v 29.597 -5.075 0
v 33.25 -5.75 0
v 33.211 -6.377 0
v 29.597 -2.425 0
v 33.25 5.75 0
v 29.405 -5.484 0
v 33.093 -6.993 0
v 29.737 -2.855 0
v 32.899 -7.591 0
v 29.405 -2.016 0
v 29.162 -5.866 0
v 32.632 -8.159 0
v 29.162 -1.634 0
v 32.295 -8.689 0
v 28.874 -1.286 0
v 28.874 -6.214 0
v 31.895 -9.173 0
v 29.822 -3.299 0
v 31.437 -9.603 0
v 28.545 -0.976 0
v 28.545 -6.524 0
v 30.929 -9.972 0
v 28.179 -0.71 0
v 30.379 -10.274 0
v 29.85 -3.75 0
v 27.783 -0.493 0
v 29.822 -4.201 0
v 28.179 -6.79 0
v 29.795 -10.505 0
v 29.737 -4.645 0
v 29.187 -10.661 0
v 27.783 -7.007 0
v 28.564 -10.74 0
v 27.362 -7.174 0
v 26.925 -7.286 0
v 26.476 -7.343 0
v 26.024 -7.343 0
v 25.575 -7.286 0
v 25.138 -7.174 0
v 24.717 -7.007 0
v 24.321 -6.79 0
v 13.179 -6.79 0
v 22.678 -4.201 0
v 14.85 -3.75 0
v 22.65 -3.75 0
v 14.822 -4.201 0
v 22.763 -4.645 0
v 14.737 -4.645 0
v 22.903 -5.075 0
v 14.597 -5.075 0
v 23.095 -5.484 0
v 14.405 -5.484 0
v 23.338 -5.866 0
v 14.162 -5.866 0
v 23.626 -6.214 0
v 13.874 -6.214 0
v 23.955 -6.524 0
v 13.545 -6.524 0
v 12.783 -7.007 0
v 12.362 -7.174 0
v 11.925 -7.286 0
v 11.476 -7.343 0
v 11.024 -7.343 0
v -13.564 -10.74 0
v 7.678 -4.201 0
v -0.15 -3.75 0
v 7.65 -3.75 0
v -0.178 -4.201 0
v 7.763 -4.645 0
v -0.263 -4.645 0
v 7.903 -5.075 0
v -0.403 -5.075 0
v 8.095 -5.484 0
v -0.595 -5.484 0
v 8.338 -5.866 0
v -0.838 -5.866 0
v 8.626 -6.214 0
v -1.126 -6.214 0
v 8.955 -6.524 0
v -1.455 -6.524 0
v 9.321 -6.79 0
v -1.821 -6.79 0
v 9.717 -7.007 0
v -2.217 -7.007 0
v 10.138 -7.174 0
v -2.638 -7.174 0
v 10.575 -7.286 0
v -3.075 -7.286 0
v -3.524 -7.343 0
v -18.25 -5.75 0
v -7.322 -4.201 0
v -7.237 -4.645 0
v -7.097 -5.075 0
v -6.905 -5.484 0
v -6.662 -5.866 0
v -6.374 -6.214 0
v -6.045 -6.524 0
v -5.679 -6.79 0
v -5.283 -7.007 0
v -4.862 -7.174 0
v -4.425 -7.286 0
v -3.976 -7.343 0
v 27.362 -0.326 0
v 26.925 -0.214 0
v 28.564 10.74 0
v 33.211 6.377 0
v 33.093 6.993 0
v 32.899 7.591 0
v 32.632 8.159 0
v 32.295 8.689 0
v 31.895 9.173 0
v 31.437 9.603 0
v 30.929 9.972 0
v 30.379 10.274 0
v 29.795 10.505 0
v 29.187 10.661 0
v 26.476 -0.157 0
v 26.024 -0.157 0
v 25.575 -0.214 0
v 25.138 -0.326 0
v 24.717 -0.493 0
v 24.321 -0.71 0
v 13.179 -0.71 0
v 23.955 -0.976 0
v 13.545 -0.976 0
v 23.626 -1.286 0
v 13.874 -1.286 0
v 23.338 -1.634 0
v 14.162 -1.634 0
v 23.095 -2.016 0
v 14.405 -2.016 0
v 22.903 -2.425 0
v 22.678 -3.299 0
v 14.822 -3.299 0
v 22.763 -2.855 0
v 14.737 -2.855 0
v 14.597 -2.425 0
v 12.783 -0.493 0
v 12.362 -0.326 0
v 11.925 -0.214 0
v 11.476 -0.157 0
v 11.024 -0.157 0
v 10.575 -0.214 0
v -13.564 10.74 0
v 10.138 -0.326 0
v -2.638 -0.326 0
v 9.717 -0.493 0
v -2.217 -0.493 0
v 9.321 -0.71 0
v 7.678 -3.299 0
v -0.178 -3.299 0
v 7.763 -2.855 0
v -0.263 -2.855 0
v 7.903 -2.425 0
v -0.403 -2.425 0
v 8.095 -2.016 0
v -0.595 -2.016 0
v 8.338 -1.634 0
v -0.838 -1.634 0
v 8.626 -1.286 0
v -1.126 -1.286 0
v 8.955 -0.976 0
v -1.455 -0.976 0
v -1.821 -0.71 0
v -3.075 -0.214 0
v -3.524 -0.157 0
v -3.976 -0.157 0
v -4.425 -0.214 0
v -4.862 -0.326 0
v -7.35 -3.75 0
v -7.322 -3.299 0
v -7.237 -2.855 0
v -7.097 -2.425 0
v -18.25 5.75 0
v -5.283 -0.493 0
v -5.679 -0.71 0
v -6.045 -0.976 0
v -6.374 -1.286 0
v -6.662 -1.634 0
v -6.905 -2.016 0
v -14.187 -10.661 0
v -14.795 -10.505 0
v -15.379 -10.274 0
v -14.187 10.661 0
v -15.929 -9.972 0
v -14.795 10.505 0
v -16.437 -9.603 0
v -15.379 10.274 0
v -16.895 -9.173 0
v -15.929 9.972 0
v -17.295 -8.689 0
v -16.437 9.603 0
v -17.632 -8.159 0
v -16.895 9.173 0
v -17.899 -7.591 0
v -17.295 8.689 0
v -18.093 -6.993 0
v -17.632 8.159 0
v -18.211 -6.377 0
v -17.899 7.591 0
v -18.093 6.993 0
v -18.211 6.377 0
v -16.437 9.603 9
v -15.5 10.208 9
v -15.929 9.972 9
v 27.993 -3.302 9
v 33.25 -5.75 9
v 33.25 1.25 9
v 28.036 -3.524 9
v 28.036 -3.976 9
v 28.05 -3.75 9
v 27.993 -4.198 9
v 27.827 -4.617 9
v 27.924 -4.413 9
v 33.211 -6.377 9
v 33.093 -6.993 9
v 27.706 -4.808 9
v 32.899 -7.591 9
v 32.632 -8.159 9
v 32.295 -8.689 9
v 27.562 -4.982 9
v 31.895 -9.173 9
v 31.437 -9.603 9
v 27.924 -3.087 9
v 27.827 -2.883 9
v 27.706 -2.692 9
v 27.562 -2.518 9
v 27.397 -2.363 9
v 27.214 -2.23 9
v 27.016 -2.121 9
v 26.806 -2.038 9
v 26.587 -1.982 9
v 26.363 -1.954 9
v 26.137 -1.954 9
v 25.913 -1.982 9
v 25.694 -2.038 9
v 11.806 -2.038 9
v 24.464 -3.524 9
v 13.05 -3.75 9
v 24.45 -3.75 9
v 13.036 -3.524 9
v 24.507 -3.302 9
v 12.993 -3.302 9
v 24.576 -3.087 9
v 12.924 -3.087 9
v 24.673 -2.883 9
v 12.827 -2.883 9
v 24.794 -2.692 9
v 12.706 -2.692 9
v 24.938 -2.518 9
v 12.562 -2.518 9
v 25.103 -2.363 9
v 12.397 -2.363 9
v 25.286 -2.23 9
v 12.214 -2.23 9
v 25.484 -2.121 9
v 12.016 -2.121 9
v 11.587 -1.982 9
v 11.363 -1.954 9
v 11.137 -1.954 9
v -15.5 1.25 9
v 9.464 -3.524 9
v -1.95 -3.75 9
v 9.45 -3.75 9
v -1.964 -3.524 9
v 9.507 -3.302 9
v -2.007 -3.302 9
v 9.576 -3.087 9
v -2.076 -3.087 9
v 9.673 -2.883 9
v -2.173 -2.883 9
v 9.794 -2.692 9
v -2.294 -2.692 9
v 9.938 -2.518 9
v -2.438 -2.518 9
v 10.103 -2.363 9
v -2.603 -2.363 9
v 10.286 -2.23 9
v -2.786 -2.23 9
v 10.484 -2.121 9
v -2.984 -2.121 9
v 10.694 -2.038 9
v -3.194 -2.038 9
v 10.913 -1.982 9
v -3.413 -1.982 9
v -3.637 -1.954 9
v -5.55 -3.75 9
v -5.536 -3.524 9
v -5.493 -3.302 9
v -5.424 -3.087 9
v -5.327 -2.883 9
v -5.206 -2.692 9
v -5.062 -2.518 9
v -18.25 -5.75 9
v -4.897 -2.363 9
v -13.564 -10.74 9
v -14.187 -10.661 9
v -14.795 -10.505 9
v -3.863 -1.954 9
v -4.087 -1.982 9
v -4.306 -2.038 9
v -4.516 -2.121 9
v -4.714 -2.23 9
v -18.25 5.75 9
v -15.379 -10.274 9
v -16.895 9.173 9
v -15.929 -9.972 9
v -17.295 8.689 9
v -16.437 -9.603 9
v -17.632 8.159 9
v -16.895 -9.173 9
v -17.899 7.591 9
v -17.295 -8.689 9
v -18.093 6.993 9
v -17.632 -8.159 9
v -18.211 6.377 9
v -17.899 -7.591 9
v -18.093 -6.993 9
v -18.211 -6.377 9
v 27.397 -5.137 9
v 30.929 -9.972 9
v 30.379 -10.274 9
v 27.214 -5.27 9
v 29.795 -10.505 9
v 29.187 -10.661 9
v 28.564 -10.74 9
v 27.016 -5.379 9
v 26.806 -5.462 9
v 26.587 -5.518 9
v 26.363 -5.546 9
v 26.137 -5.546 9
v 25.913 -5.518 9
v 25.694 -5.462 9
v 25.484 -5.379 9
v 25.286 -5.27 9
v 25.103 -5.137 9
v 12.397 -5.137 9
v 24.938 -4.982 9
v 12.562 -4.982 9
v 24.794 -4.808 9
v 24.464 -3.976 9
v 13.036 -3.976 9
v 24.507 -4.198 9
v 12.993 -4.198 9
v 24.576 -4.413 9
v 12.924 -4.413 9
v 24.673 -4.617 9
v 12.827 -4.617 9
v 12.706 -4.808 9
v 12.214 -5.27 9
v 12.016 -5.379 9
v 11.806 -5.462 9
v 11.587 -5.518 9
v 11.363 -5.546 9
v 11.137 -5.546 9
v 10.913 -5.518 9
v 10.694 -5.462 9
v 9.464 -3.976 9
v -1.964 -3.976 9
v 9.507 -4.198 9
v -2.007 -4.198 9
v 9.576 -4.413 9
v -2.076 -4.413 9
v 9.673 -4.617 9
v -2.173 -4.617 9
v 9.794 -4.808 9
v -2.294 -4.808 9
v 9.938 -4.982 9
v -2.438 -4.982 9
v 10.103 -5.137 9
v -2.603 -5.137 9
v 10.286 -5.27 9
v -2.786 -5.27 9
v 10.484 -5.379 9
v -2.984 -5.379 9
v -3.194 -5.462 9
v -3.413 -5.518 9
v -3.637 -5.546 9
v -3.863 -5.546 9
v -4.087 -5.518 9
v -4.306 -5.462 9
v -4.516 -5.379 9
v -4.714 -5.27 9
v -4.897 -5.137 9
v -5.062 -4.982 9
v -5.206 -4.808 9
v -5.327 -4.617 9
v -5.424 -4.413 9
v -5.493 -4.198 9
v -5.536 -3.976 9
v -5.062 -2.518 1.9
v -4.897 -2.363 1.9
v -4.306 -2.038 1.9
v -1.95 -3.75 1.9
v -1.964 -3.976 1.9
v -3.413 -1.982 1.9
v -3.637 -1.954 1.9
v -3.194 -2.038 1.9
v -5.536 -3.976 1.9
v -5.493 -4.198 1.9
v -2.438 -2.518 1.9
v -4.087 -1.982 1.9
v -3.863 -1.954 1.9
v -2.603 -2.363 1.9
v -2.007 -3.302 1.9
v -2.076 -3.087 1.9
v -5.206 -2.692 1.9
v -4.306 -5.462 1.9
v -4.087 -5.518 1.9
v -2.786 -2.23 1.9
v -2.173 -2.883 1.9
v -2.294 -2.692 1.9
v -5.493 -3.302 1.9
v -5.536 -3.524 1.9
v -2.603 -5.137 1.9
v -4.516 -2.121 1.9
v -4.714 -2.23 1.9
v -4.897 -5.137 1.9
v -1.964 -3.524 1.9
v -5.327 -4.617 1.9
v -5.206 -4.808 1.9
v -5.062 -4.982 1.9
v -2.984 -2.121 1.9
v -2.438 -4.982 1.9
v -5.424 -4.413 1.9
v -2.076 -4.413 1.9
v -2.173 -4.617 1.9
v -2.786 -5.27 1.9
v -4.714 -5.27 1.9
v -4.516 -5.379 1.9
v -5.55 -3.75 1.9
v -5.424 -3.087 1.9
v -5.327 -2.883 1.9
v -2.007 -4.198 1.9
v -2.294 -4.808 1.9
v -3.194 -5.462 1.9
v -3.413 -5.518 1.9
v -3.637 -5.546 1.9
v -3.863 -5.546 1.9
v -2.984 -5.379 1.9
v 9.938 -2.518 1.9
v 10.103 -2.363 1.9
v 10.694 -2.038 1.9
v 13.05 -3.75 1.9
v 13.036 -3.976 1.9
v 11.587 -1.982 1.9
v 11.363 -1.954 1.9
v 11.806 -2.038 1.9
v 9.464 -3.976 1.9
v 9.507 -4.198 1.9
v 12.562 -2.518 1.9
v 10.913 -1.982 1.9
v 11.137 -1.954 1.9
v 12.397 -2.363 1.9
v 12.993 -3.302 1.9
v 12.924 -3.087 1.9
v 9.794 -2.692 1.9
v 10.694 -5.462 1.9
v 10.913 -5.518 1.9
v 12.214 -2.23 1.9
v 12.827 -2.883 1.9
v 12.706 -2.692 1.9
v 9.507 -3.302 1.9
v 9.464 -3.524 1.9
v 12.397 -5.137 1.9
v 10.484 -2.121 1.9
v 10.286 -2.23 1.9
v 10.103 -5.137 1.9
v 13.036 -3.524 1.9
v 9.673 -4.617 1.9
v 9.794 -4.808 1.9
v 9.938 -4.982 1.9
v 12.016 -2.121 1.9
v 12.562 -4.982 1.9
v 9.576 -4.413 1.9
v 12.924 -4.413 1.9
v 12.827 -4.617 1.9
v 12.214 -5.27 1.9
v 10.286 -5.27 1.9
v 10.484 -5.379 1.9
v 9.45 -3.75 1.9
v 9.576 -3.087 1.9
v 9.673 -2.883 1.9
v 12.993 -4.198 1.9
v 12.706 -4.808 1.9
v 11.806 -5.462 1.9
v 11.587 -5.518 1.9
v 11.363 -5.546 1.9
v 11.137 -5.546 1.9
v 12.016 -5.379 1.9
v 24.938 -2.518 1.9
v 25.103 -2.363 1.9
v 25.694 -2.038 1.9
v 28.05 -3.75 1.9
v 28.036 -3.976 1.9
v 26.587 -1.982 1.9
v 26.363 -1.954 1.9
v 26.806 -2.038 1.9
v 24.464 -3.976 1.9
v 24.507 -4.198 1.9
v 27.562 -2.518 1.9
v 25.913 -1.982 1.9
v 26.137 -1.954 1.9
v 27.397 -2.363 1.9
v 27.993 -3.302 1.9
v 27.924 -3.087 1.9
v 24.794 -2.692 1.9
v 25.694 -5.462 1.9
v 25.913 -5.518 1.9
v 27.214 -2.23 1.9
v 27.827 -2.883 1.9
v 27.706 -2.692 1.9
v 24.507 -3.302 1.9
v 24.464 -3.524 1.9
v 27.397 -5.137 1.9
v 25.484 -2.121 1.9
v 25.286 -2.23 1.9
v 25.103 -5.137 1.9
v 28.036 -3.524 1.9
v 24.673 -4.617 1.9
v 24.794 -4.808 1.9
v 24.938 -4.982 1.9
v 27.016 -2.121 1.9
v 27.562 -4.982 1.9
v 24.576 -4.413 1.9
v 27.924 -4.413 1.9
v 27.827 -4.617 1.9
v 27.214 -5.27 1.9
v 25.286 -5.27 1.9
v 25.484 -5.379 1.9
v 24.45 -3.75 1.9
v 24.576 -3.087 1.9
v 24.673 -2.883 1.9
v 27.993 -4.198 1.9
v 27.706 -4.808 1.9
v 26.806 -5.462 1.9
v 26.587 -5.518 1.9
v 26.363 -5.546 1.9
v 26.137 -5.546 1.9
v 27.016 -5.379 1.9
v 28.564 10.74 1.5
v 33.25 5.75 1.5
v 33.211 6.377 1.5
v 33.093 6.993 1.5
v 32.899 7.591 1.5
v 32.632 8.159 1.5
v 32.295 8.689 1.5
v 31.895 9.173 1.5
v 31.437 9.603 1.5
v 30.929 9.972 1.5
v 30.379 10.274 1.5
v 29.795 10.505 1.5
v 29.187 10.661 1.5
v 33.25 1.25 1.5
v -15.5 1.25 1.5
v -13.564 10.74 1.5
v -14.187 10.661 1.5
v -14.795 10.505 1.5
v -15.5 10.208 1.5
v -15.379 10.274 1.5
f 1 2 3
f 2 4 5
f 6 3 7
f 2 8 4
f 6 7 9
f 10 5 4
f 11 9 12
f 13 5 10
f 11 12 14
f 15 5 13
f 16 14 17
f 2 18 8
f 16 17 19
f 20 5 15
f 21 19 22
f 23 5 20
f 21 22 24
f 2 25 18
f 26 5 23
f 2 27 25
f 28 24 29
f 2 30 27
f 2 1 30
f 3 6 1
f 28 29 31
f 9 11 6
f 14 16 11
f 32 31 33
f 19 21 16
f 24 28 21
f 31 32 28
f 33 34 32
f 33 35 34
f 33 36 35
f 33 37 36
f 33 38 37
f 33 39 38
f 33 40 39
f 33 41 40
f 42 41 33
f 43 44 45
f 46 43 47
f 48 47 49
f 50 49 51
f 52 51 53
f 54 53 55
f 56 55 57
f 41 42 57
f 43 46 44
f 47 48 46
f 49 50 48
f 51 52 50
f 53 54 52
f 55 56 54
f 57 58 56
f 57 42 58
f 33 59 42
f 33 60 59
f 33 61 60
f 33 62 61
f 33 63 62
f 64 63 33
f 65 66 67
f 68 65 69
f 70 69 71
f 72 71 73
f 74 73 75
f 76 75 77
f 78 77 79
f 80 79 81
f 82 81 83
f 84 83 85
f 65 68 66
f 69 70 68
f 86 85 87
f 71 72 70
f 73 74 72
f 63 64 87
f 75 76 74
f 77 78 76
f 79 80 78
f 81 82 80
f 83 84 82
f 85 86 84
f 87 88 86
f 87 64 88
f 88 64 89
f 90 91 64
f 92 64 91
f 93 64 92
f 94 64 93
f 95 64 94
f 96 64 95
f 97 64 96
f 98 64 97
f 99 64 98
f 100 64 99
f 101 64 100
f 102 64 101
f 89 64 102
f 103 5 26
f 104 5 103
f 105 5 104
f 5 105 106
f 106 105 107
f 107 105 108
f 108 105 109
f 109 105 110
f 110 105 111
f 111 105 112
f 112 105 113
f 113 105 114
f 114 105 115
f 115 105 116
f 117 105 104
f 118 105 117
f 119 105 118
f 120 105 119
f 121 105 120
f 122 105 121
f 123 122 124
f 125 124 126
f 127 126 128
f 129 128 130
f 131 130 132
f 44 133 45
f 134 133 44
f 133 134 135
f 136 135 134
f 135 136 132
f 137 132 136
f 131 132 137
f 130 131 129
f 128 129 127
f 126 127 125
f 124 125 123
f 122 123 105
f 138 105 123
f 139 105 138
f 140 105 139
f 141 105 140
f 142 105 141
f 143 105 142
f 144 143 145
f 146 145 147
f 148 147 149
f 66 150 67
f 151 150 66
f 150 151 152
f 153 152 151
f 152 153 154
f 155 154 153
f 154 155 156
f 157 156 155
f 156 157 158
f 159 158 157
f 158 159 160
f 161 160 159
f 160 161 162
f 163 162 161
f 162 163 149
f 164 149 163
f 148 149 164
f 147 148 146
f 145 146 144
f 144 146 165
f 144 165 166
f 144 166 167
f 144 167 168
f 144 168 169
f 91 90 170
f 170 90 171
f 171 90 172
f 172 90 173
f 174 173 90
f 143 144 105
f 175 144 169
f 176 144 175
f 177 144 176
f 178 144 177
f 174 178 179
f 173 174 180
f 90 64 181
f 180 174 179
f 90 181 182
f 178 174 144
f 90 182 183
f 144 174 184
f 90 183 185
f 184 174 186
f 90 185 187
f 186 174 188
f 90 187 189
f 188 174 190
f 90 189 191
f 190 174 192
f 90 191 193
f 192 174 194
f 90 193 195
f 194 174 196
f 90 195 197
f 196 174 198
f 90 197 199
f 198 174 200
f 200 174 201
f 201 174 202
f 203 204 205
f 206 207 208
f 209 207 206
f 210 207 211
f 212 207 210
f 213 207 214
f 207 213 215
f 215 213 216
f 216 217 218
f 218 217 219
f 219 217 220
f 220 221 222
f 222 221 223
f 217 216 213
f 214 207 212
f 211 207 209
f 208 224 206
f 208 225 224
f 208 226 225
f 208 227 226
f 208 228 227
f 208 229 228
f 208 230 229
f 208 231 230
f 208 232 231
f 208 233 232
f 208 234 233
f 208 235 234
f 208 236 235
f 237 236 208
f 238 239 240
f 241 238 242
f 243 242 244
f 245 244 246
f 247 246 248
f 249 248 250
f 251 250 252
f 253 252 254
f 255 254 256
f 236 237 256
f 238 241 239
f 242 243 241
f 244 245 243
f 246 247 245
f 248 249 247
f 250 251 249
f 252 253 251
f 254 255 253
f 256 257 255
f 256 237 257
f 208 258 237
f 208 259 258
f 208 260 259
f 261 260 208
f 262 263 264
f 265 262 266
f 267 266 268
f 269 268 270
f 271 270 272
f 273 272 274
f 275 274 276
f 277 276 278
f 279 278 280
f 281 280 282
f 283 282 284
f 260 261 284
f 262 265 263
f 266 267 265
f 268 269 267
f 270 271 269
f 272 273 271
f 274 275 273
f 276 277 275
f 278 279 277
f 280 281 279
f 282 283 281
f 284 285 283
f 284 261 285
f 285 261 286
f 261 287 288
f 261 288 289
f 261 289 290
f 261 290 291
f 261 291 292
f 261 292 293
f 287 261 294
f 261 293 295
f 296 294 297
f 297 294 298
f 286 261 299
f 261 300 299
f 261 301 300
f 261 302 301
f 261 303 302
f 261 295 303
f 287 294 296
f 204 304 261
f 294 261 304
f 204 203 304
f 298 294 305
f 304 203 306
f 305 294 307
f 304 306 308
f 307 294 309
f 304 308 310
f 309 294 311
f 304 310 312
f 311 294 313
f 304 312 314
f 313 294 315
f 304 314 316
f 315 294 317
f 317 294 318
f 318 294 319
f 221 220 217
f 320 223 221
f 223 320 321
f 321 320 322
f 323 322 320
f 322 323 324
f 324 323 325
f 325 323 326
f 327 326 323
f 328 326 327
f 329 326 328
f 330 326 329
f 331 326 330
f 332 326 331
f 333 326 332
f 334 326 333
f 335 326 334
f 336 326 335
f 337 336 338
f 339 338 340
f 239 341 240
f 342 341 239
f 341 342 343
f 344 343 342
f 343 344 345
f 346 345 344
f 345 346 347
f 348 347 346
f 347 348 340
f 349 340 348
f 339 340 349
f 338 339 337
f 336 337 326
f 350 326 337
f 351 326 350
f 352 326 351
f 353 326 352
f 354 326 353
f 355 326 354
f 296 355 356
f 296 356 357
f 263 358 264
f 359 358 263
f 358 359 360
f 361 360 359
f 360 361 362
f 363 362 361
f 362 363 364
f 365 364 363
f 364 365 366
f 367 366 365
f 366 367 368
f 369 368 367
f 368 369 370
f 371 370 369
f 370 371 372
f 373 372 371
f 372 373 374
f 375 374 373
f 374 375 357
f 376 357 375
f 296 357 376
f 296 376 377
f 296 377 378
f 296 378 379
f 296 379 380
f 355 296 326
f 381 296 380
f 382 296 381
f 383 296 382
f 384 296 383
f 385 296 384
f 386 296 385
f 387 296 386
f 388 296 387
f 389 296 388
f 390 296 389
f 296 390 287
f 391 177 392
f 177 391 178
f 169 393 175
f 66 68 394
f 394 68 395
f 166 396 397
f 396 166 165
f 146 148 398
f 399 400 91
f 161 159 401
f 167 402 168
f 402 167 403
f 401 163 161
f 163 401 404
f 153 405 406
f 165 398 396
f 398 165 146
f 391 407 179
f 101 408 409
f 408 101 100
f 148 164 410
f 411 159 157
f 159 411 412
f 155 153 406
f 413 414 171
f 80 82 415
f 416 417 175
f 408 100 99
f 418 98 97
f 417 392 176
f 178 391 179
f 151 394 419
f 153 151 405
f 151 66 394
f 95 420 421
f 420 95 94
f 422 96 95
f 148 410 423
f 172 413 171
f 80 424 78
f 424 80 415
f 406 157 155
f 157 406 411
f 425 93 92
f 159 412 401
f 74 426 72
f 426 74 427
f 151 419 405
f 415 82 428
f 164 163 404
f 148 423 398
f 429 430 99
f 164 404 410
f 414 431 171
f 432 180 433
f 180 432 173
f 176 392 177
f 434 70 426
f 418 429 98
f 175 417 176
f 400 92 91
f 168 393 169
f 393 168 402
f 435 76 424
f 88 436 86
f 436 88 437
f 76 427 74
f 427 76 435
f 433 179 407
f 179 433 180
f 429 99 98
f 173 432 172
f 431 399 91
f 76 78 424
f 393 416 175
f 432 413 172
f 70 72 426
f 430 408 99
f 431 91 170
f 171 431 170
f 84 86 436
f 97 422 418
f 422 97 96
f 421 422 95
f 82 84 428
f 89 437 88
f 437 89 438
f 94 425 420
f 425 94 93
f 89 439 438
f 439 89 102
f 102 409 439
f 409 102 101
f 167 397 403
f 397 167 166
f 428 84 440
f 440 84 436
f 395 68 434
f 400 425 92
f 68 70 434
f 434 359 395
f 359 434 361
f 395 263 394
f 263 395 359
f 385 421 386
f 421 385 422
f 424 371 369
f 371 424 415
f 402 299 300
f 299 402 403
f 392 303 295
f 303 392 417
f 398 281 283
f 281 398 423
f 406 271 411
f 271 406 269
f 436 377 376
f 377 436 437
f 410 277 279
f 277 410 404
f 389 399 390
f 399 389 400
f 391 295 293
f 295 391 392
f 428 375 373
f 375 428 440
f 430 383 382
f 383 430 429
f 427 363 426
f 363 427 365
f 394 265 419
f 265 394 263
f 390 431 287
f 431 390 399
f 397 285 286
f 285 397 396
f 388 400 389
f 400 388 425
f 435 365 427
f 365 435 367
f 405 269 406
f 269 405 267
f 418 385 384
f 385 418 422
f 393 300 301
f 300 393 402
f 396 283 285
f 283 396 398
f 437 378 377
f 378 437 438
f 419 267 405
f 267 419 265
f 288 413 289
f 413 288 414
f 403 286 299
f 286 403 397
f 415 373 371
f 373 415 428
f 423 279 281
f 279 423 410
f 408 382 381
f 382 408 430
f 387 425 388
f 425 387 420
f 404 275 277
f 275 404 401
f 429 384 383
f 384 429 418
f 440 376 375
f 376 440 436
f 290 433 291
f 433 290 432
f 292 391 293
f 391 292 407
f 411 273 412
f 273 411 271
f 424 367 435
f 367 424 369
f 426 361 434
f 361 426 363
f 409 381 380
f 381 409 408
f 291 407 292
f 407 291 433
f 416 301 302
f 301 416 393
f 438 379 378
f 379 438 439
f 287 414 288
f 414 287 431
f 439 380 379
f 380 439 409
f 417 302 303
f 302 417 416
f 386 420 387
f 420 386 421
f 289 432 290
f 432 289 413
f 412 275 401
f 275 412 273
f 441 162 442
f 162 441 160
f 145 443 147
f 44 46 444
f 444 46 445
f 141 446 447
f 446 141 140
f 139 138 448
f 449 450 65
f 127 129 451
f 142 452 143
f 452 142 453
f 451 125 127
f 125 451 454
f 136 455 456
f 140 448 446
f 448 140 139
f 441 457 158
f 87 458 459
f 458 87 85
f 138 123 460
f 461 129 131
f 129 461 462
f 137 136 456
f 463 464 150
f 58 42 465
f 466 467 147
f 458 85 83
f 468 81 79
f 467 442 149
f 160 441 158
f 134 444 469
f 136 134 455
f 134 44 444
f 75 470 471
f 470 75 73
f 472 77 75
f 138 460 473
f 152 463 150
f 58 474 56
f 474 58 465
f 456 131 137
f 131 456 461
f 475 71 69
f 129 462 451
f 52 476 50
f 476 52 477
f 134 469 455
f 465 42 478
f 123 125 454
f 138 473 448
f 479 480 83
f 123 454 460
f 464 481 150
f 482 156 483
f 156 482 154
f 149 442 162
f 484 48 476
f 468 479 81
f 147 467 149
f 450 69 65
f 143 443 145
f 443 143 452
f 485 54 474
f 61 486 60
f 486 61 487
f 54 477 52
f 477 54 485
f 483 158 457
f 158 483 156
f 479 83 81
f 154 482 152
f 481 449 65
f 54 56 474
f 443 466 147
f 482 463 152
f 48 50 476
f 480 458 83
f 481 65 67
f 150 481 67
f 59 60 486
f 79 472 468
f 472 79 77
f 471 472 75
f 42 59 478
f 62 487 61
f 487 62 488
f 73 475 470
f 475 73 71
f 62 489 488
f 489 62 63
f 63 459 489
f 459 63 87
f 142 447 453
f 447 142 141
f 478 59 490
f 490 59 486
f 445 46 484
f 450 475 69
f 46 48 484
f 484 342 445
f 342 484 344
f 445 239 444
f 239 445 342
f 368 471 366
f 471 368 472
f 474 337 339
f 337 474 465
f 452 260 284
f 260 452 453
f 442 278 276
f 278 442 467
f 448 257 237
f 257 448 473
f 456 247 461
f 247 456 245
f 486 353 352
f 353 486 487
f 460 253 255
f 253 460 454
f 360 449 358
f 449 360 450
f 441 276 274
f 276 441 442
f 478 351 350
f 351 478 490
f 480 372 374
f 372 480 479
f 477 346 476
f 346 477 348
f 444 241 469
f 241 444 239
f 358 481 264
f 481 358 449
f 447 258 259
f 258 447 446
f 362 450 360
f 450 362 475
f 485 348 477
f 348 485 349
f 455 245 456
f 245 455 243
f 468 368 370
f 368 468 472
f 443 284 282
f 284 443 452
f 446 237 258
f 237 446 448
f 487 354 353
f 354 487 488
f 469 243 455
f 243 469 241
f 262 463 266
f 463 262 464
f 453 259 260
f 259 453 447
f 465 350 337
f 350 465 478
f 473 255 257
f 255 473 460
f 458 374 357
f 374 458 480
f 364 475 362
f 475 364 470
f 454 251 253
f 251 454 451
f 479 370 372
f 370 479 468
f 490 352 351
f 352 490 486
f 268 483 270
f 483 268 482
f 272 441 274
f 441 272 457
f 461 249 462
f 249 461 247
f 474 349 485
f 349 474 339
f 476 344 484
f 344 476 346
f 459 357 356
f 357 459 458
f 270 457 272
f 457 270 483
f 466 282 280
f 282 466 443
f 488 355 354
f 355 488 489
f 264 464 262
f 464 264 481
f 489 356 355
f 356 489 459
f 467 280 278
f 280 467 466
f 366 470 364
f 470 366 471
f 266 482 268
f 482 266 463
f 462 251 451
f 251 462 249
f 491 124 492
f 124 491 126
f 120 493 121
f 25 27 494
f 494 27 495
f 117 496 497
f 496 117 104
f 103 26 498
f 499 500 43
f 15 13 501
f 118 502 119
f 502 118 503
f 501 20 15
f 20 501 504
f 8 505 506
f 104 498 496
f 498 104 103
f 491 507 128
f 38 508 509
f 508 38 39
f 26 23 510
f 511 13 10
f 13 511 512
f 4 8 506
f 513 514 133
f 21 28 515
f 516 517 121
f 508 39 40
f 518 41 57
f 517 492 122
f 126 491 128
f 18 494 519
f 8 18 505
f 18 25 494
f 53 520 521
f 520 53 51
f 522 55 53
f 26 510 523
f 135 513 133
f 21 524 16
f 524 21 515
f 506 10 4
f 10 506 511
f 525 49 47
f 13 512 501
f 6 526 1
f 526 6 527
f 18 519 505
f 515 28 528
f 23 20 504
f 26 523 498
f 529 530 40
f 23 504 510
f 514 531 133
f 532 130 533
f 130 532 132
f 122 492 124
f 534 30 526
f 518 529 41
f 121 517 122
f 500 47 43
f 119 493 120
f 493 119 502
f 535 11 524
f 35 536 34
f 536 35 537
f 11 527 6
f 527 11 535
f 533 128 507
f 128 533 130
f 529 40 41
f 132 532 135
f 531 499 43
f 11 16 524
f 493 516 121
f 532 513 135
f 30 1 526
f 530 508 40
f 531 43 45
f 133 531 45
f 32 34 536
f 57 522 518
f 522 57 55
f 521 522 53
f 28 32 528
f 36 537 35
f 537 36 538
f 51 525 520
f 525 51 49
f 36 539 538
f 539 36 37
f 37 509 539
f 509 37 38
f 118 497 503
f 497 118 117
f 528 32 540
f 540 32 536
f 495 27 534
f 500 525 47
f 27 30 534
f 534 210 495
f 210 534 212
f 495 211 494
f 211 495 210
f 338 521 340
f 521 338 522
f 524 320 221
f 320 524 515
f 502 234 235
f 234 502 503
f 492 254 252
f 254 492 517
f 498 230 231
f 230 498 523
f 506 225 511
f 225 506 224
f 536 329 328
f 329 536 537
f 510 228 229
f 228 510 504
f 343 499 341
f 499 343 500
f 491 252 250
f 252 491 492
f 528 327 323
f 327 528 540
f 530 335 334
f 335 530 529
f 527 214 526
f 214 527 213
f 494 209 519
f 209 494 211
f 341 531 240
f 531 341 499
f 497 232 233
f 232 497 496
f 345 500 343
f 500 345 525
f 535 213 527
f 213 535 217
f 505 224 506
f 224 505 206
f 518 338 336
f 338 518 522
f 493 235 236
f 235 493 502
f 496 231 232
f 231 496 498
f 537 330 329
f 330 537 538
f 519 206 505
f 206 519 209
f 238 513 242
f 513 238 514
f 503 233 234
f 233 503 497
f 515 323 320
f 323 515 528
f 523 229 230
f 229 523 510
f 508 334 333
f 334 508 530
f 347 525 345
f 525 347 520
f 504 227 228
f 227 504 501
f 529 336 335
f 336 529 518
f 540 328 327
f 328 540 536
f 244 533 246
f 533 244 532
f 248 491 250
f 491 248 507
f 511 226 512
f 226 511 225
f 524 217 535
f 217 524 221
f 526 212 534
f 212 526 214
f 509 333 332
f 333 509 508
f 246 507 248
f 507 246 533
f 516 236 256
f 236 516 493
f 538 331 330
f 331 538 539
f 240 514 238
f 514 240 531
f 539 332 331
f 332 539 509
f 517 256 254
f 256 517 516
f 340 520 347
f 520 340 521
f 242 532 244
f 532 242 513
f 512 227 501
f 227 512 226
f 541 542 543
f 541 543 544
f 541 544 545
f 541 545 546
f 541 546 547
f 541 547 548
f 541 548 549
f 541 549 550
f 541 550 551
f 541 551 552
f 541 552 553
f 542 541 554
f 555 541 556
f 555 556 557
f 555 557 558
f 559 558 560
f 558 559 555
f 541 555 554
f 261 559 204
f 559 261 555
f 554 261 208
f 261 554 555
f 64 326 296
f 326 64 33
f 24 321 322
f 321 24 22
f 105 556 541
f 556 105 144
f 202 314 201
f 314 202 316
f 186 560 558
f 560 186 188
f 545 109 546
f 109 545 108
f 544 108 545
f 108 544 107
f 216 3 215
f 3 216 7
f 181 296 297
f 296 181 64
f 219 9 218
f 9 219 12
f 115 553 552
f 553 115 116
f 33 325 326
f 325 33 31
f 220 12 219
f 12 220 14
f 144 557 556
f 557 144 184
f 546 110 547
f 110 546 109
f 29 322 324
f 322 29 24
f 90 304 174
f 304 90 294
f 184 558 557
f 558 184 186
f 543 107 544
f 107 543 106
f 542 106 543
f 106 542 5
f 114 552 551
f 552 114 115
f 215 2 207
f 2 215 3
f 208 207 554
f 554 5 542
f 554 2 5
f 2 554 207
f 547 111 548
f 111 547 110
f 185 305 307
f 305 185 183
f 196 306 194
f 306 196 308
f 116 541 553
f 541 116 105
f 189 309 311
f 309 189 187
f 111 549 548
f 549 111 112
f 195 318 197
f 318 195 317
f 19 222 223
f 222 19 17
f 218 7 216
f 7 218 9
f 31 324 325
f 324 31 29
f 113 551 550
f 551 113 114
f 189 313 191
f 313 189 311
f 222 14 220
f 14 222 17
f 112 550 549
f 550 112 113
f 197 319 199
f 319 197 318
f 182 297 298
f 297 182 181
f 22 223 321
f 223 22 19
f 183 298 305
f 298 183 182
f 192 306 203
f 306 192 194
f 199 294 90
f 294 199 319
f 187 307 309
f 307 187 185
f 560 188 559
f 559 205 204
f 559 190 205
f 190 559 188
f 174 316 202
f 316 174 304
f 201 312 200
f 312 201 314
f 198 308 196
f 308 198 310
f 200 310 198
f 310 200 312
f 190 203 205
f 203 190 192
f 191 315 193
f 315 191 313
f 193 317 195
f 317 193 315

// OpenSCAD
$fn = 50;


difference() {
	union() {
		translate(v = [7.5000000000, 0, 0]) {
			hull() {
				translate(v = [-20.7500000000, 5.7500000000, 0]) {
					cylinder(h = 9, r = 5);
				}
				translate(v = [20.7500000000, 5.7500000000, 0]) {
					cylinder(h = 9, r = 5);
				}
				translate(v = [-20.7500000000, -5.7500000000, 0]) {
					cylinder(h = 9, r = 5);
				}
				translate(v = [20.7500000000, -5.7500000000, 0]) {
					cylinder(h = 9, r = 5);
				}
			}
		}
	}
	union() {
		translate(v = [-3.7500000000, -3.7500000000, 0]) {
			rotate(a = [180, 0, 0]) {
				difference() {
					union() {
						#translate(v = [0, 0, -9.0000000000]) {
							cylinder(h = 9, r = 1.5000000000);
						}
						#translate(v = [0, 0, -1.9000000000]) {
							cylinder(h = 1.9000000000, r1 = 1.8000000000, r2 = 3.6000000000);
						}
						#translate(v = [0, 0, -9.0000000000]) {
							cylinder(h = 9, r = 1.8000000000);
						}
						#translate(v = [0, 0, -9.0000000000]) {
							cylinder(h = 9, r = 1.5000000000);
						}
					}
					union();
				}
			}
		}
		translate(v = [11.2500000000, -3.7500000000, 0]) {
			rotate(a = [180, 0, 0]) {
				difference() {
					union() {
						#translate(v = [0, 0, -9.0000000000]) {
							cylinder(h = 9, r = 1.5000000000);
						}
						#translate(v = [0, 0, -1.9000000000]) {
							cylinder(h = 1.9000000000, r1 = 1.8000000000, r2 = 3.6000000000);
						}
						#translate(v = [0, 0, -9.0000000000]) {
							cylinder(h = 9, r = 1.8000000000);
						}
						#translate(v = [0, 0, -9.0000000000]) {
							cylinder(h = 9, r = 1.5000000000);
						}
					}
					union();
				}
			}
		}
		translate(v = [26.2500000000, -3.7500000000, 0]) {
			rotate(a = [180, 0, 0]) {
				difference() {
					union() {
						#translate(v = [0, 0, -9.0000000000]) {
							cylinder(h = 9, r = 1.5000000000);
						}
						#translate(v = [0, 0, -1.9000000000]) {
							cylinder(h = 1.9000000000, r1 = 1.8000000000, r2 = 3.6000000000);
						}
						#translate(v = [0, 0, -9.0000000000]) {
							cylinder(h = 9, r = 1.8000000000);
						}
						#translate(v = [0, 0, -9.0000000000]) {
							cylinder(h = 9, r = 1.5000000000);
						}
					}
					union();
				}
			}
		}
		translate(v = [41.2500000000, -3.7500000000, 0]) {
			rotate(a = [180, 0, 0]) {
				difference() {
					union() {
						#translate(v = [0, 0, -9.0000000000]) {
							cylinder(h = 9, r = 1.5000000000);
						}
						#translate(v = [0, 0, -1.9000000000]) {
							cylinder(h = 1.9000000000, r1 = 1.8000000000, r2 = 3.6000000000);
						}
						#translate(v = [0, 0, -9.0000000000]) {
							cylinder(h = 9, r = 1.8000000000);
						}
						#translate(v = [0, 0, -9.0000000000]) {
							cylinder(h = 9, r = 1.5000000000);
						}
					}
					union();
				}
			}
		}
		#translate(v = [-15.5000000000, 1.2500000000, 1.5000000000]) {
			cube(size = [101.6000000000, 155.4000000000, 7.5000000000]);
		}
	}
}
